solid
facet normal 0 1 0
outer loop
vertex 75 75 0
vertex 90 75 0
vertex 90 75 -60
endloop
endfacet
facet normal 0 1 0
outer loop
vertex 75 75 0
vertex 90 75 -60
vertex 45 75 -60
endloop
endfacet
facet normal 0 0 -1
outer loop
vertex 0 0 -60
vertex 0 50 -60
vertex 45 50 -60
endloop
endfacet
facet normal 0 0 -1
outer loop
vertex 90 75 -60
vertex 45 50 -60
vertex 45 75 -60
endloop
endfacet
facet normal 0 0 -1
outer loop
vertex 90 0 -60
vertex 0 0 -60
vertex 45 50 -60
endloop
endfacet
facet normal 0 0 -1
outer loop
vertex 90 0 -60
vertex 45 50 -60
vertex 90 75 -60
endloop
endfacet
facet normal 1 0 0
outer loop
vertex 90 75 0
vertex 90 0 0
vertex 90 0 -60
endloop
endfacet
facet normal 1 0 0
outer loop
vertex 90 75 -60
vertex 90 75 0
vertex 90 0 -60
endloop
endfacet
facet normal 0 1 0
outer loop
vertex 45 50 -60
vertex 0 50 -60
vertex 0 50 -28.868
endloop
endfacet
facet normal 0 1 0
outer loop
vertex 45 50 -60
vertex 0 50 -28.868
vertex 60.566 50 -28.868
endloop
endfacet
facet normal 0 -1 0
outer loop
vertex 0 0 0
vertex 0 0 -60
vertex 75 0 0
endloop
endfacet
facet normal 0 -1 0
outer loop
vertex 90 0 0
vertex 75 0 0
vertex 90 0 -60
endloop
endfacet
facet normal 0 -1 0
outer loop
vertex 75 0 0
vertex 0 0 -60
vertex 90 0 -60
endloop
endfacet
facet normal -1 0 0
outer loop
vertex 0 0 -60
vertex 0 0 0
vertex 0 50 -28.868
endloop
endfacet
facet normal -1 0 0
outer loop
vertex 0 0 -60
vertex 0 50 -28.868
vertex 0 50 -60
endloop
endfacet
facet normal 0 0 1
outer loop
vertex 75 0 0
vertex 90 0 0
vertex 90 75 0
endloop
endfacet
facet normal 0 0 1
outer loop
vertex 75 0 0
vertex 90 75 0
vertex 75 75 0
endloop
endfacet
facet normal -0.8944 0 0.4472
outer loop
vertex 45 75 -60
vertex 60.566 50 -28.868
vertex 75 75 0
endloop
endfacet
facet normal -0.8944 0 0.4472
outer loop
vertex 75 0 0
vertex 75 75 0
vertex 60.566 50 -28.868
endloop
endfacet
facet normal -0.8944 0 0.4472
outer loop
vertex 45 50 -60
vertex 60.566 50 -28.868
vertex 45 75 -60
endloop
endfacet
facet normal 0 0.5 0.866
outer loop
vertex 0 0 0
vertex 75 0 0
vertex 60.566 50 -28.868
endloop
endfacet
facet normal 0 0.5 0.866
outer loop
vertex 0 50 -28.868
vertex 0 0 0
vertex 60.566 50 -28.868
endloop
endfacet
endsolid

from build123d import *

# Parameters (mm, degrees)
SKETCH1_W      = 90
SKETCH1_H      = 60
EXTRUDE1_DEPTH = 50
EXTRUDE2_DEPTH = 91
EXTRUDE3_DEPTH = 75


with BuildPart() as part:
    # Sketch1 → Extrude1 (new body)
    with BuildSketch(Plane(origin=(0, 0, 0), x_dir=(1, 0, 0), z_dir=(0, 1, 0))):
        with Locations((45, 30)):
            Rectangle(SKETCH1_W, SKETCH1_H)
    extrude(amount=EXTRUDE1_DEPTH)

    # Sketch2 → Extrude2 (cut, through all)
    with BuildSketch(Plane(origin=(90, 0, 0), x_dir=(0, 0, -1), z_dir=(1, 0, 0))):
        Polygon((0, 0), (28.867513459, 50), (0, 50), align=None)
    extrude(amount=-EXTRUDE2_DEPTH, mode=Mode.SUBTRACT)

    # Sketch3 → Extrude3 (add)
    with BuildSketch(Plane(origin=(0, 0, 0), x_dir=(1, 0, 0), z_dir=(0, 1, 0))):
        Polygon((90, 60), (90, 0), (75, 0), (45, 60), align=None)
    extrude(amount=EXTRUDE3_DEPTH)


solid = part.part
